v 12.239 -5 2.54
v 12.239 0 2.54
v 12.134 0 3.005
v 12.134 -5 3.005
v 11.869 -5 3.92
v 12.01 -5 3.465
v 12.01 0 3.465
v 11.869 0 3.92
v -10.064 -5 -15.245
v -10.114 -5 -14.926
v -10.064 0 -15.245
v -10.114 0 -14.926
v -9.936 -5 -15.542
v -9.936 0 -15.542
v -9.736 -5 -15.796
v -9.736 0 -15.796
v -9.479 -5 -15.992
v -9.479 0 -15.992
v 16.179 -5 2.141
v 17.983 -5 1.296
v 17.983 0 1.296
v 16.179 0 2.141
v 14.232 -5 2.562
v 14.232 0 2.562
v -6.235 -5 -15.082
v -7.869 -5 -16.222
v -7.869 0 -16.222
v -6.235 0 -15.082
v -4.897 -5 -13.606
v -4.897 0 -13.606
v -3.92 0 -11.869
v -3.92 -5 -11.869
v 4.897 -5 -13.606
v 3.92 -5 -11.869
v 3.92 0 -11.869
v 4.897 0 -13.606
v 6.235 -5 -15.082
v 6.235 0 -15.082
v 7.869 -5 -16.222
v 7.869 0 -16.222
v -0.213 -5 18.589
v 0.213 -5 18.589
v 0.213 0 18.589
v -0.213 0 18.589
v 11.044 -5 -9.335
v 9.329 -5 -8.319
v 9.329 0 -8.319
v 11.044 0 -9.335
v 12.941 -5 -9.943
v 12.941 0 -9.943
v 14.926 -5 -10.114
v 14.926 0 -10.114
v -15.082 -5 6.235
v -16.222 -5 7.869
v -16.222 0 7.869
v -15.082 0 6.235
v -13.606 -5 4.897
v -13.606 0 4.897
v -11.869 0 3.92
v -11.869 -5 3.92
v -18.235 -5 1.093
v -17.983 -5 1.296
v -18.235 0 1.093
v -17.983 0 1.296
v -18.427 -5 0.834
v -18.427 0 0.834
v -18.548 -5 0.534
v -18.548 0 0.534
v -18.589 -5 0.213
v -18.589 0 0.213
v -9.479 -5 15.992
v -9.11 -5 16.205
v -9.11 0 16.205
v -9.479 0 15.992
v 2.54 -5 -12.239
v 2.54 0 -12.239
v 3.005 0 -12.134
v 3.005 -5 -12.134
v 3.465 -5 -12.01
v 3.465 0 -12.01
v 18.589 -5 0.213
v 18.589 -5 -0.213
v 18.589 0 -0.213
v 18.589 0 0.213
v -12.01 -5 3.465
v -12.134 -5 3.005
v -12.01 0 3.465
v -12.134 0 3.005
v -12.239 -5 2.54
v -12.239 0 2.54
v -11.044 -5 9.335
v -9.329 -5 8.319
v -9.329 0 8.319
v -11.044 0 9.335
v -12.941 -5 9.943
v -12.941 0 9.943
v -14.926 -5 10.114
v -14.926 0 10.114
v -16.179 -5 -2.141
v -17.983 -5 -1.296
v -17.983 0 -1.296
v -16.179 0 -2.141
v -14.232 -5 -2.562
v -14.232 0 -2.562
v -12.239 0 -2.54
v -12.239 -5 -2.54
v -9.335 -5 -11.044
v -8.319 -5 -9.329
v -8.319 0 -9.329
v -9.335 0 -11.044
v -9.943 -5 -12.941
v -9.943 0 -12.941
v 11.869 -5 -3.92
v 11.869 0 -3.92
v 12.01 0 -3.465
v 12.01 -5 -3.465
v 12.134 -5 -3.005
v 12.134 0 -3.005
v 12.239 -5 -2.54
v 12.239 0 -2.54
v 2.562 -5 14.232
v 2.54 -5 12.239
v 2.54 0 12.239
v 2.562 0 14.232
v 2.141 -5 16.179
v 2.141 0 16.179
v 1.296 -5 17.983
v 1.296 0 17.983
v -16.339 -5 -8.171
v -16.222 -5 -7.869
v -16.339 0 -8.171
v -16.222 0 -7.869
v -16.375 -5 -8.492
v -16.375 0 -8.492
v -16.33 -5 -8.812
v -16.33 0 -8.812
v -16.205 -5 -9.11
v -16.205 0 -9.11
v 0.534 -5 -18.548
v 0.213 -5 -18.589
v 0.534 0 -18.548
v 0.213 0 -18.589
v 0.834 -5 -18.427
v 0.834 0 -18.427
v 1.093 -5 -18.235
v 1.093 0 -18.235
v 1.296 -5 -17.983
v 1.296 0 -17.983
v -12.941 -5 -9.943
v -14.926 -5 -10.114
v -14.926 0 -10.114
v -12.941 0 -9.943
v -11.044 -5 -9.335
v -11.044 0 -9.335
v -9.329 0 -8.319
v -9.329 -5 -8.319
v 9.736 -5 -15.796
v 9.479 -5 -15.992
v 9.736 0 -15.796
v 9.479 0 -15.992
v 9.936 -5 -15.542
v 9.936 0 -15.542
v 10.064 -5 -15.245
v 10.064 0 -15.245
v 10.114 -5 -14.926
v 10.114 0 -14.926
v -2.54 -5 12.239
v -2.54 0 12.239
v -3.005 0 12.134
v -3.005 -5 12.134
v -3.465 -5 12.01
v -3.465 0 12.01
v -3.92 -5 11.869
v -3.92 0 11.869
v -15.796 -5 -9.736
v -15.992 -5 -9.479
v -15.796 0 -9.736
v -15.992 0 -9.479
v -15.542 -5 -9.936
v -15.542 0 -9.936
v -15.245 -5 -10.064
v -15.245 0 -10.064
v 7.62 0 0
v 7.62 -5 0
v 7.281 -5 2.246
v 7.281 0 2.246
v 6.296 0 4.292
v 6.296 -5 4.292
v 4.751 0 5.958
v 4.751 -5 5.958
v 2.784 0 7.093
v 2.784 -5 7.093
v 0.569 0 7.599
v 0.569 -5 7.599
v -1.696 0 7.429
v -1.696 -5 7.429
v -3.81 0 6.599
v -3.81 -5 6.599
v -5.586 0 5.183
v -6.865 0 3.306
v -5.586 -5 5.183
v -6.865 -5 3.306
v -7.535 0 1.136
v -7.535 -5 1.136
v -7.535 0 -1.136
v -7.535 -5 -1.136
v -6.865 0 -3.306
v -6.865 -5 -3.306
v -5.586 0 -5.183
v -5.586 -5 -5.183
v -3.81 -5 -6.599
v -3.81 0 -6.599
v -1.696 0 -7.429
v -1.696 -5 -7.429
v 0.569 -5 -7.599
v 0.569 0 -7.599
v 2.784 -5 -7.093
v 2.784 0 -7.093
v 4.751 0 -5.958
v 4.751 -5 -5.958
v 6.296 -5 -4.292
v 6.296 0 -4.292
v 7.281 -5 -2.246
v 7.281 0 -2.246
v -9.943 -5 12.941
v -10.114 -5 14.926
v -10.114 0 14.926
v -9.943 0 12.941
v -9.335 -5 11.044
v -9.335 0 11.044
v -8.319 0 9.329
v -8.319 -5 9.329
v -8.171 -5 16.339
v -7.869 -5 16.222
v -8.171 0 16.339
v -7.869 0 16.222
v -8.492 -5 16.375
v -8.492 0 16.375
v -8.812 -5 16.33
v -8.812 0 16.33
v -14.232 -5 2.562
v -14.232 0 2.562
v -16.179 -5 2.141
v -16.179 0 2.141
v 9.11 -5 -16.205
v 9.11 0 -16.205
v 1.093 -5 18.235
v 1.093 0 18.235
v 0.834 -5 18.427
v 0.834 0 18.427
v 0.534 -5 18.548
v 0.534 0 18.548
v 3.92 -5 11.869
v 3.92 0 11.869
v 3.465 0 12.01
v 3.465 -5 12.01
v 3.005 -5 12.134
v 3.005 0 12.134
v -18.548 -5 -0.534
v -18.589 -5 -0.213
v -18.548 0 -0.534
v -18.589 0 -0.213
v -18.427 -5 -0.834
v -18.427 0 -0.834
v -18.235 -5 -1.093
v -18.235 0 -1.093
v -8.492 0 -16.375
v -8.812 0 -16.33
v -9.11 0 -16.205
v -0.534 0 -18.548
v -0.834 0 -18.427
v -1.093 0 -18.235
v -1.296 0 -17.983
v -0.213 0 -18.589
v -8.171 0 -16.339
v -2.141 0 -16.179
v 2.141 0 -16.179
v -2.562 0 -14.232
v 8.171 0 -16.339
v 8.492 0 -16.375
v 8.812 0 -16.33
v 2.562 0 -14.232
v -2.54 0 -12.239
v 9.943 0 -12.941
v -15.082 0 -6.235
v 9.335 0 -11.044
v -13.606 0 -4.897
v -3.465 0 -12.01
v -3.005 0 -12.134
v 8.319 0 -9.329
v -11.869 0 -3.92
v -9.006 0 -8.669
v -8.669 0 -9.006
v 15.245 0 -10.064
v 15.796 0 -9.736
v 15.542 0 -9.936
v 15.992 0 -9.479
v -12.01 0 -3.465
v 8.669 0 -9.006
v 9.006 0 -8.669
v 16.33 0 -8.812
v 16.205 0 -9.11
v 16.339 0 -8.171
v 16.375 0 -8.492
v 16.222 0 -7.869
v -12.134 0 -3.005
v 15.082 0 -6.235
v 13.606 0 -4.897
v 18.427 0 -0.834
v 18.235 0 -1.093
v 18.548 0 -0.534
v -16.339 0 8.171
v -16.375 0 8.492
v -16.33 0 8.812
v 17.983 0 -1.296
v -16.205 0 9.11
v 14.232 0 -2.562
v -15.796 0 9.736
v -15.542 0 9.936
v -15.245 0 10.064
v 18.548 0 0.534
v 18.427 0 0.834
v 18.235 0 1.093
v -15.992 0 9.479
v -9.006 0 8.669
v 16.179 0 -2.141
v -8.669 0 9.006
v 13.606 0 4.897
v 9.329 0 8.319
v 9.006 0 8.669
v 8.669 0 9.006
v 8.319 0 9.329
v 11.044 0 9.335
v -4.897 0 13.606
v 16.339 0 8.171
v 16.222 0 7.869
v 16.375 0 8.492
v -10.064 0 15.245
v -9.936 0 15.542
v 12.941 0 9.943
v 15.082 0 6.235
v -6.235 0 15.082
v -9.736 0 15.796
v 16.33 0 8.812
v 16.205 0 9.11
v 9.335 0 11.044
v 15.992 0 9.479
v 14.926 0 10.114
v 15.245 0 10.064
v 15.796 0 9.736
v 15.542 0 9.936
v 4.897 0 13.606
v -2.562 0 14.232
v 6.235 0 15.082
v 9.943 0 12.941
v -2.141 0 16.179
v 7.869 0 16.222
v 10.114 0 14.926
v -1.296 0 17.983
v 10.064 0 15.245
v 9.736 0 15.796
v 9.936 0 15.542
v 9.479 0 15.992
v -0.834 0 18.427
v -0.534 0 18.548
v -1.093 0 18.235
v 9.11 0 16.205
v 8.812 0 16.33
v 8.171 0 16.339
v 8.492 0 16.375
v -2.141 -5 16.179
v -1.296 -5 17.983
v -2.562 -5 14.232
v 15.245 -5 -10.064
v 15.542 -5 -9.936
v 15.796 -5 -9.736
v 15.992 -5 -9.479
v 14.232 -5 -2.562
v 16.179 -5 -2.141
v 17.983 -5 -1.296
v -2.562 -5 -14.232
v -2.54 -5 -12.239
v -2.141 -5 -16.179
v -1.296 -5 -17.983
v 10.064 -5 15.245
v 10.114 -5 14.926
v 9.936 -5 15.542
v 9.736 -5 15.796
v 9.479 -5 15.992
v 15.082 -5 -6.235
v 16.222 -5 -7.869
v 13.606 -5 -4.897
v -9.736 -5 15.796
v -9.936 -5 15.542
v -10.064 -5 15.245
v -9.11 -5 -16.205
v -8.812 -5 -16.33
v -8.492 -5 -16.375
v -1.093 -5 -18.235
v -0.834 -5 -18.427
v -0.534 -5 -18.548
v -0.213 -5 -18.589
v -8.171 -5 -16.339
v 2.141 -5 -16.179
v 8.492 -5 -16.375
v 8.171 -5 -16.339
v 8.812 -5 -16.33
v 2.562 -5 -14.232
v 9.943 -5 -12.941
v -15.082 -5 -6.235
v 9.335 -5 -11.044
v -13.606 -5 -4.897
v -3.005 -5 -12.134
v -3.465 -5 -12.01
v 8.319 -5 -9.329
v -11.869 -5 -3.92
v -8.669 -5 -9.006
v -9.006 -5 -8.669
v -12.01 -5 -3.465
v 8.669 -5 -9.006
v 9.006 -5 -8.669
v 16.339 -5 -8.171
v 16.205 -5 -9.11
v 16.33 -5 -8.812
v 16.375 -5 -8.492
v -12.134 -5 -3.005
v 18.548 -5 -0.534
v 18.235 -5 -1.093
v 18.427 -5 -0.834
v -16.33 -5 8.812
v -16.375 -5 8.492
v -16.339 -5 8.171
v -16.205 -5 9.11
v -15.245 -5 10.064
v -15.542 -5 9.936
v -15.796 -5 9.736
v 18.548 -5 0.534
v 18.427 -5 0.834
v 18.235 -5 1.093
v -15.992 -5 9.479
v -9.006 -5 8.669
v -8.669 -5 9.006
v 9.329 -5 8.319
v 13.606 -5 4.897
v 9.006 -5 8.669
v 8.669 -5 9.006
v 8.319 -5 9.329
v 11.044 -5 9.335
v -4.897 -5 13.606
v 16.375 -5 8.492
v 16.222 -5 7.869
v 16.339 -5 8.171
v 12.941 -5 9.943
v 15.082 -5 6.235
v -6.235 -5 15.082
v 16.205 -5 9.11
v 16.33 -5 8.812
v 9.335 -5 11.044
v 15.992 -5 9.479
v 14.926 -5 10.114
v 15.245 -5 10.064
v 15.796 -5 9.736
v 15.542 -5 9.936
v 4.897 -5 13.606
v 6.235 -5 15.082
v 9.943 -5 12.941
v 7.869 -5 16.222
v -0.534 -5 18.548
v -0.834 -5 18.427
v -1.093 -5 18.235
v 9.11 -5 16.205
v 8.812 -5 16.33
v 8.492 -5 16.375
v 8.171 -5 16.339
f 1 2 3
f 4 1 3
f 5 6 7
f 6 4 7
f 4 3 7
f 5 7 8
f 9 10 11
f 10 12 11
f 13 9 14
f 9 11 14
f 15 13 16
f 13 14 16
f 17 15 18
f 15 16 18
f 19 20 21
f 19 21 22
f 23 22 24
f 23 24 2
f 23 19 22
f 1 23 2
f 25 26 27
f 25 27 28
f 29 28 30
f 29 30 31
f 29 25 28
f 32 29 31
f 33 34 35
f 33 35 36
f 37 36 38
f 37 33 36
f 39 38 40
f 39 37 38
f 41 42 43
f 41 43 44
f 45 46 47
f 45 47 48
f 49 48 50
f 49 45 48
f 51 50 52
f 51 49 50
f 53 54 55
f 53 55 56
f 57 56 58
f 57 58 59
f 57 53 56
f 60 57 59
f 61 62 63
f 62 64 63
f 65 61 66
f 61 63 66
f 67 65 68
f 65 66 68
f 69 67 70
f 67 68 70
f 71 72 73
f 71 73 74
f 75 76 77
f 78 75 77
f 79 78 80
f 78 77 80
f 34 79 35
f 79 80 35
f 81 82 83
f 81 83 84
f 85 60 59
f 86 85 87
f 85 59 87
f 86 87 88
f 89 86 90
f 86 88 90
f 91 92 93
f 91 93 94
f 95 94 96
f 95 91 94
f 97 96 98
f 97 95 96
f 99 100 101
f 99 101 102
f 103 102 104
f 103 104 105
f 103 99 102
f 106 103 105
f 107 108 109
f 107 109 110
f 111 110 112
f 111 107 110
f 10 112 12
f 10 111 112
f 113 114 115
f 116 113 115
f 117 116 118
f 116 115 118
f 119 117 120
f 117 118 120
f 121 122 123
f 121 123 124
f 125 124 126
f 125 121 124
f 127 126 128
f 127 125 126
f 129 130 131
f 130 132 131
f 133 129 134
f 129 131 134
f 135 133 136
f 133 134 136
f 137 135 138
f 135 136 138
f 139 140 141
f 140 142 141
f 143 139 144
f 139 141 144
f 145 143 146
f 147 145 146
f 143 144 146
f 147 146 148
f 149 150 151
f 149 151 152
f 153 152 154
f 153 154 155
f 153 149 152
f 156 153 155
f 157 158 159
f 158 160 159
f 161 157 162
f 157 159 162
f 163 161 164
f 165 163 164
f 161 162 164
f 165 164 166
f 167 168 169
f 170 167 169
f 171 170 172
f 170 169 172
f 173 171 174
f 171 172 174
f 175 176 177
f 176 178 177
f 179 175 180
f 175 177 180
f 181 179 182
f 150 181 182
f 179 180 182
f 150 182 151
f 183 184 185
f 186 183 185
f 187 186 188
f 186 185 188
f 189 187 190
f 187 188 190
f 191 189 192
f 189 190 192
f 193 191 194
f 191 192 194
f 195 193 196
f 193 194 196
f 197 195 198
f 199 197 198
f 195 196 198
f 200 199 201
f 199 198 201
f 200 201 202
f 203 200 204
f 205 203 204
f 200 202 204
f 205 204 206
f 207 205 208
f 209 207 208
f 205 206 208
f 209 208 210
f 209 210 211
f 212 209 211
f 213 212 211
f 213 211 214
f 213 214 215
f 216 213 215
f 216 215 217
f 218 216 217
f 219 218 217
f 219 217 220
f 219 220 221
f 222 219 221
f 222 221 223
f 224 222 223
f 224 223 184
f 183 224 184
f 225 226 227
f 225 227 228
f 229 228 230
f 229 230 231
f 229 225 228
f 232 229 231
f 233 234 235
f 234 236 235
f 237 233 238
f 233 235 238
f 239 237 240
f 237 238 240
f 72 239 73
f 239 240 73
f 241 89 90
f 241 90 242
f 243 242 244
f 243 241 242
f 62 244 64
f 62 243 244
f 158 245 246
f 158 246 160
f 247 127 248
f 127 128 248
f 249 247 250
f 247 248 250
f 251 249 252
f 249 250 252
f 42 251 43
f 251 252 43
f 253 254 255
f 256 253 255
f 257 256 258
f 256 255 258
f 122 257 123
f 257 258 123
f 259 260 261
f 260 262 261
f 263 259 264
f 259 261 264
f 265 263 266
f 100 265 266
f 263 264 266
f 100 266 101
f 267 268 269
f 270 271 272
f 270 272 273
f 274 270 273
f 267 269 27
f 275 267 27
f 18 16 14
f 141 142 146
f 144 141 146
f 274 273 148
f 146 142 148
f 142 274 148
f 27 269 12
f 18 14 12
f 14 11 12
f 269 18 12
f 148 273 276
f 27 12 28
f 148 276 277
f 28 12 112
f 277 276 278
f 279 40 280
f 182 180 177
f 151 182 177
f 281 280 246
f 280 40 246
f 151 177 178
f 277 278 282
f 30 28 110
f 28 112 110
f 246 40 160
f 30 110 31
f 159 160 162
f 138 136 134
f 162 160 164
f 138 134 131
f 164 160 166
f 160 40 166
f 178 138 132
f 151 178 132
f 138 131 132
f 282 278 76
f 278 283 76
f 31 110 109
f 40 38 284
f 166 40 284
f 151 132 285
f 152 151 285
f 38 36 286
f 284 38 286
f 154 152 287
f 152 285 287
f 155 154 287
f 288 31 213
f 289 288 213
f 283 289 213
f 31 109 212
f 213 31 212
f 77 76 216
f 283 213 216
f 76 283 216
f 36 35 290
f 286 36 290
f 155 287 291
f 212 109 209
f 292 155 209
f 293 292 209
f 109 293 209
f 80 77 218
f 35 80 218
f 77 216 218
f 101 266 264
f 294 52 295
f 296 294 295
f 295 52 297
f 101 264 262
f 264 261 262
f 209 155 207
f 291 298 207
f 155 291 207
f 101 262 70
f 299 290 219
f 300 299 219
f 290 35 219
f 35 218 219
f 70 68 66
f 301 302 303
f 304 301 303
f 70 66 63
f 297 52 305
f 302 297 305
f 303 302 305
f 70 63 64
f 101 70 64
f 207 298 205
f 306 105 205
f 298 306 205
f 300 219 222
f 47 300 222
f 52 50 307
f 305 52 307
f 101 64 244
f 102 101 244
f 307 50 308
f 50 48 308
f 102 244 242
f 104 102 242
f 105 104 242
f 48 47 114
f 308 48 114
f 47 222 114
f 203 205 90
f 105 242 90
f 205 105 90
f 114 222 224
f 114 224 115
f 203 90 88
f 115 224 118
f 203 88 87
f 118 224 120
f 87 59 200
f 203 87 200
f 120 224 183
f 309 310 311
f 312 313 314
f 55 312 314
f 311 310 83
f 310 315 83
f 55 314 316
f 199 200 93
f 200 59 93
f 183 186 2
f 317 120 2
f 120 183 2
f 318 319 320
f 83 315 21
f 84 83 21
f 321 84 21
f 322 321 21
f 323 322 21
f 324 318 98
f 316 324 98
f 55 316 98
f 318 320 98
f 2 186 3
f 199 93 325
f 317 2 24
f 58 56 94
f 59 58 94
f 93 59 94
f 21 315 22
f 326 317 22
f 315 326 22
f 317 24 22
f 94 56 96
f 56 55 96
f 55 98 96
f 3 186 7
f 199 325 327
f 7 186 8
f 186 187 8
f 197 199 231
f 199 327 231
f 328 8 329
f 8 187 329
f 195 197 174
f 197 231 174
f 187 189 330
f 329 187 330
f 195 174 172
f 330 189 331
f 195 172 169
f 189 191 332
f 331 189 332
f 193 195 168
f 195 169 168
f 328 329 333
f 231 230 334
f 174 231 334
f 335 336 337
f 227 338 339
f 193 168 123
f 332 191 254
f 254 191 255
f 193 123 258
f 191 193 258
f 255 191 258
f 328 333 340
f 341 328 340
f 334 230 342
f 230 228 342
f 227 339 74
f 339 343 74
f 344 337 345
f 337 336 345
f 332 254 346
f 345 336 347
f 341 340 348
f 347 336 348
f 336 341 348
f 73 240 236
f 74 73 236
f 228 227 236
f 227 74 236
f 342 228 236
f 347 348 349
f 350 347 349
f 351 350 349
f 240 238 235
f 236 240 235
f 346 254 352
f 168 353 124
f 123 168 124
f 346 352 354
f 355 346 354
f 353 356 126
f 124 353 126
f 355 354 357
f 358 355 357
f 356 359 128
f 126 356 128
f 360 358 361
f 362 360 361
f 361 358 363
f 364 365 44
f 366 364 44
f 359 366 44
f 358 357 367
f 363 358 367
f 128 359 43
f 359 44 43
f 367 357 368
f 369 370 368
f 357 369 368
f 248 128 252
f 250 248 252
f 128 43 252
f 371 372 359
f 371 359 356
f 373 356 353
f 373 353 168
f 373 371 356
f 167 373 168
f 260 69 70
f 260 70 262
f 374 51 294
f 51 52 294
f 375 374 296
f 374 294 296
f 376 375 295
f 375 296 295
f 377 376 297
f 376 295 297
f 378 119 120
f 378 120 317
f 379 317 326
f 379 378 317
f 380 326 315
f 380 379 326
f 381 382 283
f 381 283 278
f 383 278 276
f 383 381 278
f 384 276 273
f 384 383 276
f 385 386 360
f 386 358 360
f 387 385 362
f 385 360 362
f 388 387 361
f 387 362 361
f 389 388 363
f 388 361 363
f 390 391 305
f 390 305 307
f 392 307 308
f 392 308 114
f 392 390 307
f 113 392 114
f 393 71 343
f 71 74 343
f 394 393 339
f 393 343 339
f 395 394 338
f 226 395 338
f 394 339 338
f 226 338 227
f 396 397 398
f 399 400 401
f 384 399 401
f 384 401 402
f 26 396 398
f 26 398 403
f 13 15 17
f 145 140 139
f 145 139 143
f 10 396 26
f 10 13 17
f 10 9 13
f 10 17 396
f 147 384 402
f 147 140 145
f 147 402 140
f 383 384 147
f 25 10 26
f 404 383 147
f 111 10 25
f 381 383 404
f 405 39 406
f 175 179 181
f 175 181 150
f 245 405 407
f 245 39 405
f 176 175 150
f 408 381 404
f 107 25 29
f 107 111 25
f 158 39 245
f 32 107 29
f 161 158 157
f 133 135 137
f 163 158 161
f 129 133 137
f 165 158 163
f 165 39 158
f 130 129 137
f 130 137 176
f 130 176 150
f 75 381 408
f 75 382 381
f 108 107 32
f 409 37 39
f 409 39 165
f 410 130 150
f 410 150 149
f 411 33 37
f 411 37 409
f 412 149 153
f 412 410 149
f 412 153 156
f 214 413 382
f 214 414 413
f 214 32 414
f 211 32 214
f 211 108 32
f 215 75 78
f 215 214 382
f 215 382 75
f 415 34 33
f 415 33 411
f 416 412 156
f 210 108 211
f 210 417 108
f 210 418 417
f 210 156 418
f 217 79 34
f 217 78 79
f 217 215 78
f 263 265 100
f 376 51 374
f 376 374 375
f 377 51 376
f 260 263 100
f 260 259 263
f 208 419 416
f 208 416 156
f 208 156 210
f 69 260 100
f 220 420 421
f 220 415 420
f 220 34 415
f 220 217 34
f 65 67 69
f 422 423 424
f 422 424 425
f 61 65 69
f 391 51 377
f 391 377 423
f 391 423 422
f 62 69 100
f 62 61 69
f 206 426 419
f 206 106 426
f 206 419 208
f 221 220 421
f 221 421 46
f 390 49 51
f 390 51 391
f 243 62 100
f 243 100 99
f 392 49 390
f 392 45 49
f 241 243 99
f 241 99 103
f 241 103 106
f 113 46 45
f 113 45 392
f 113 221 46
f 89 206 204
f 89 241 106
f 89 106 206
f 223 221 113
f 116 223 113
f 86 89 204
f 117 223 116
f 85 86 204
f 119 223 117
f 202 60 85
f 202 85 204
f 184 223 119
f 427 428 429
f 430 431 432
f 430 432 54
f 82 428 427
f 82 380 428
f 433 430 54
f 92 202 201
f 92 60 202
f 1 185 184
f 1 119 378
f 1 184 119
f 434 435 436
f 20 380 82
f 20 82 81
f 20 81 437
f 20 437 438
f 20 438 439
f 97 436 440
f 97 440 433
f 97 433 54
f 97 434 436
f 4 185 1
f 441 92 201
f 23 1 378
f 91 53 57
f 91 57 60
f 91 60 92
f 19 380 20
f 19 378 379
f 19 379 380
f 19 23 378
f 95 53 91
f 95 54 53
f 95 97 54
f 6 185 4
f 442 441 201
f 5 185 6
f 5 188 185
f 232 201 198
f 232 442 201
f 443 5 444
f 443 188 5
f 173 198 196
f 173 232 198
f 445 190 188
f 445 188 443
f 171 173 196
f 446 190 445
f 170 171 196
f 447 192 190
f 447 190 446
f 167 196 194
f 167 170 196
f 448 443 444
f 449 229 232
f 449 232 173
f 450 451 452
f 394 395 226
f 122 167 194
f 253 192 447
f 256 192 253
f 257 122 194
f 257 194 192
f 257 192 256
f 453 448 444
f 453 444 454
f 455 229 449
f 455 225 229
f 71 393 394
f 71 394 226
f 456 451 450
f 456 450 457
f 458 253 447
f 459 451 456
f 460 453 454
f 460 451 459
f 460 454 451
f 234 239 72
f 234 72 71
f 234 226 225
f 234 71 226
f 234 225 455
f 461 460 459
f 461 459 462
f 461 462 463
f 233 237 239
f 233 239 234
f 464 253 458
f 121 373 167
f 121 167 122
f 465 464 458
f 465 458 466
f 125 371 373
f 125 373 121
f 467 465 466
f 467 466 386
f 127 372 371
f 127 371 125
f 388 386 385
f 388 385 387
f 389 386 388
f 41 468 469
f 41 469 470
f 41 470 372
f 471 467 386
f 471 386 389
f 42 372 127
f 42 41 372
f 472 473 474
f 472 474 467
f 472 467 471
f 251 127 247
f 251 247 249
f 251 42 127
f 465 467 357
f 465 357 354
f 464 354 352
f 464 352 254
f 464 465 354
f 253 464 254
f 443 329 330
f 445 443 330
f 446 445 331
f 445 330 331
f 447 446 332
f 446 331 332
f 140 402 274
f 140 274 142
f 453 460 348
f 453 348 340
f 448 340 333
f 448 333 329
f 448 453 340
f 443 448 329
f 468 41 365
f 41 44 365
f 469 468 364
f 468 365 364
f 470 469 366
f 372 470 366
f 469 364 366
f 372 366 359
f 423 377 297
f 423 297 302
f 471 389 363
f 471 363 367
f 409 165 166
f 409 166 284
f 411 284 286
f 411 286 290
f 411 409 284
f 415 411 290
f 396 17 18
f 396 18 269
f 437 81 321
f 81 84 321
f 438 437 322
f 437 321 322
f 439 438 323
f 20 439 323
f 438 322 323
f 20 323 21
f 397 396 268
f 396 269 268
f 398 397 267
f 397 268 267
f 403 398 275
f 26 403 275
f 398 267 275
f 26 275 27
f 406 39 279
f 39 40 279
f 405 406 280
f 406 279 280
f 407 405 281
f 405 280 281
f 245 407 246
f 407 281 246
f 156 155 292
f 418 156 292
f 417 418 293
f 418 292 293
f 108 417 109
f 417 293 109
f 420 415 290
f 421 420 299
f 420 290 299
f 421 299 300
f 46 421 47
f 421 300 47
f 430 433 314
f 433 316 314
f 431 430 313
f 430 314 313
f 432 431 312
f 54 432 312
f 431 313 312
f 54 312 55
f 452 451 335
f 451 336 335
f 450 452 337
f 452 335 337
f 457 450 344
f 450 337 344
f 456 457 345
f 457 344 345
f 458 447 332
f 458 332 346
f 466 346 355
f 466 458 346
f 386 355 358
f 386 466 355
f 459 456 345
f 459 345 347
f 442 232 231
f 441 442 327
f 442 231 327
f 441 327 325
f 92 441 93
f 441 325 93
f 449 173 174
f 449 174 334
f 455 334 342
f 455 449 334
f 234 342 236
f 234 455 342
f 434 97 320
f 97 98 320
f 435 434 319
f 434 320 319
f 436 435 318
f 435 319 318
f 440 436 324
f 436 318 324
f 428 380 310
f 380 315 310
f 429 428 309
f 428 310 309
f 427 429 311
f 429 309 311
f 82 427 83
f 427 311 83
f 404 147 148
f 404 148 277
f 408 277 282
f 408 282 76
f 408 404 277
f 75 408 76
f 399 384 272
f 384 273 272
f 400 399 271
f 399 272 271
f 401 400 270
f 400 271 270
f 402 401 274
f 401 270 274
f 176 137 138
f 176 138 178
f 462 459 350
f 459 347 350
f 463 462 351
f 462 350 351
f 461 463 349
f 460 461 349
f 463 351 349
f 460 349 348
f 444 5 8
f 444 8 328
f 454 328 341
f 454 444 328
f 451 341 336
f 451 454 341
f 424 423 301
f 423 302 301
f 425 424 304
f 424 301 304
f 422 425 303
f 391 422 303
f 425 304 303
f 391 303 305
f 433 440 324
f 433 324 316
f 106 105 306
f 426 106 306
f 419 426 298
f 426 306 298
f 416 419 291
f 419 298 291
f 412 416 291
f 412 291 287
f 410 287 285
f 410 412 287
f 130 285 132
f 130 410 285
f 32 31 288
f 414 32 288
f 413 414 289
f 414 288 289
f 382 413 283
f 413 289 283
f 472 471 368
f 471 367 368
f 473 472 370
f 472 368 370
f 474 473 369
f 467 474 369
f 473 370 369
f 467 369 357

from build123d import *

# Parameters (mm, degrees)
F0_R     = 12.5
F1_DEPTH = 5
F3_DEPTH = 5
F4_R     = 1.27
F5_COUNT = 12
F6_R     = 7.62
F7_DEPTH = 25.4


with BuildPart() as f1:
    # F0 (on Front) → F1 (new body)
    with BuildSketch(Plane.XZ):
        Circle(F0_R)
    extrude(amount=F1_DEPTH)

    # F2 (on face) → F3 (join, through all)
    with BuildSketch(Plane.XZ.offset(5)):
        with BuildLine():
            ThreePointArc((-2.54, 12.2392156611), (0, 12.5), (2.54, 12.2392156611))
            ThreePointArc((2.54, 12.2392156611), (2.3217431159, 15.5720988713), (0.889, 18.5892156611))
            Line((0.889, 18.5892156611), (-0.889, 18.5892156611))
            ThreePointArc((-0.889, 18.5892156611), (-2.3217431159, 15.5720988713), (-2.54, 12.2392156611))
        make_face()
    extrude(amount=-F3_DEPTH)

    # F4
    f4_edges = [f1.edges().sort_by_distance(p)[0] for p in [
        (-0.889, -2.5, 18.589216),
        (0.889, -2.5, 18.589216),
    ]]
    fillet(f4_edges, radius=F4_R)

    # F5: F1 ×12 about axis
    f5_axis = Axis((0, 0, 0), (0, 1, 0))


with BuildPart() as f1_1:
    add(f1.part)
    for i in range(1, F5_COUNT):
        add(f1.part.rotate(f5_axis, i * 360 / F5_COUNT))

    # F6 (on face) → F7 (cut)
    with BuildSketch(Plane.XZ.offset(5)):
        Circle(F6_R)
    extrude(amount=-F7_DEPTH, mode=Mode.SUBTRACT)


solid = f1_1.part
